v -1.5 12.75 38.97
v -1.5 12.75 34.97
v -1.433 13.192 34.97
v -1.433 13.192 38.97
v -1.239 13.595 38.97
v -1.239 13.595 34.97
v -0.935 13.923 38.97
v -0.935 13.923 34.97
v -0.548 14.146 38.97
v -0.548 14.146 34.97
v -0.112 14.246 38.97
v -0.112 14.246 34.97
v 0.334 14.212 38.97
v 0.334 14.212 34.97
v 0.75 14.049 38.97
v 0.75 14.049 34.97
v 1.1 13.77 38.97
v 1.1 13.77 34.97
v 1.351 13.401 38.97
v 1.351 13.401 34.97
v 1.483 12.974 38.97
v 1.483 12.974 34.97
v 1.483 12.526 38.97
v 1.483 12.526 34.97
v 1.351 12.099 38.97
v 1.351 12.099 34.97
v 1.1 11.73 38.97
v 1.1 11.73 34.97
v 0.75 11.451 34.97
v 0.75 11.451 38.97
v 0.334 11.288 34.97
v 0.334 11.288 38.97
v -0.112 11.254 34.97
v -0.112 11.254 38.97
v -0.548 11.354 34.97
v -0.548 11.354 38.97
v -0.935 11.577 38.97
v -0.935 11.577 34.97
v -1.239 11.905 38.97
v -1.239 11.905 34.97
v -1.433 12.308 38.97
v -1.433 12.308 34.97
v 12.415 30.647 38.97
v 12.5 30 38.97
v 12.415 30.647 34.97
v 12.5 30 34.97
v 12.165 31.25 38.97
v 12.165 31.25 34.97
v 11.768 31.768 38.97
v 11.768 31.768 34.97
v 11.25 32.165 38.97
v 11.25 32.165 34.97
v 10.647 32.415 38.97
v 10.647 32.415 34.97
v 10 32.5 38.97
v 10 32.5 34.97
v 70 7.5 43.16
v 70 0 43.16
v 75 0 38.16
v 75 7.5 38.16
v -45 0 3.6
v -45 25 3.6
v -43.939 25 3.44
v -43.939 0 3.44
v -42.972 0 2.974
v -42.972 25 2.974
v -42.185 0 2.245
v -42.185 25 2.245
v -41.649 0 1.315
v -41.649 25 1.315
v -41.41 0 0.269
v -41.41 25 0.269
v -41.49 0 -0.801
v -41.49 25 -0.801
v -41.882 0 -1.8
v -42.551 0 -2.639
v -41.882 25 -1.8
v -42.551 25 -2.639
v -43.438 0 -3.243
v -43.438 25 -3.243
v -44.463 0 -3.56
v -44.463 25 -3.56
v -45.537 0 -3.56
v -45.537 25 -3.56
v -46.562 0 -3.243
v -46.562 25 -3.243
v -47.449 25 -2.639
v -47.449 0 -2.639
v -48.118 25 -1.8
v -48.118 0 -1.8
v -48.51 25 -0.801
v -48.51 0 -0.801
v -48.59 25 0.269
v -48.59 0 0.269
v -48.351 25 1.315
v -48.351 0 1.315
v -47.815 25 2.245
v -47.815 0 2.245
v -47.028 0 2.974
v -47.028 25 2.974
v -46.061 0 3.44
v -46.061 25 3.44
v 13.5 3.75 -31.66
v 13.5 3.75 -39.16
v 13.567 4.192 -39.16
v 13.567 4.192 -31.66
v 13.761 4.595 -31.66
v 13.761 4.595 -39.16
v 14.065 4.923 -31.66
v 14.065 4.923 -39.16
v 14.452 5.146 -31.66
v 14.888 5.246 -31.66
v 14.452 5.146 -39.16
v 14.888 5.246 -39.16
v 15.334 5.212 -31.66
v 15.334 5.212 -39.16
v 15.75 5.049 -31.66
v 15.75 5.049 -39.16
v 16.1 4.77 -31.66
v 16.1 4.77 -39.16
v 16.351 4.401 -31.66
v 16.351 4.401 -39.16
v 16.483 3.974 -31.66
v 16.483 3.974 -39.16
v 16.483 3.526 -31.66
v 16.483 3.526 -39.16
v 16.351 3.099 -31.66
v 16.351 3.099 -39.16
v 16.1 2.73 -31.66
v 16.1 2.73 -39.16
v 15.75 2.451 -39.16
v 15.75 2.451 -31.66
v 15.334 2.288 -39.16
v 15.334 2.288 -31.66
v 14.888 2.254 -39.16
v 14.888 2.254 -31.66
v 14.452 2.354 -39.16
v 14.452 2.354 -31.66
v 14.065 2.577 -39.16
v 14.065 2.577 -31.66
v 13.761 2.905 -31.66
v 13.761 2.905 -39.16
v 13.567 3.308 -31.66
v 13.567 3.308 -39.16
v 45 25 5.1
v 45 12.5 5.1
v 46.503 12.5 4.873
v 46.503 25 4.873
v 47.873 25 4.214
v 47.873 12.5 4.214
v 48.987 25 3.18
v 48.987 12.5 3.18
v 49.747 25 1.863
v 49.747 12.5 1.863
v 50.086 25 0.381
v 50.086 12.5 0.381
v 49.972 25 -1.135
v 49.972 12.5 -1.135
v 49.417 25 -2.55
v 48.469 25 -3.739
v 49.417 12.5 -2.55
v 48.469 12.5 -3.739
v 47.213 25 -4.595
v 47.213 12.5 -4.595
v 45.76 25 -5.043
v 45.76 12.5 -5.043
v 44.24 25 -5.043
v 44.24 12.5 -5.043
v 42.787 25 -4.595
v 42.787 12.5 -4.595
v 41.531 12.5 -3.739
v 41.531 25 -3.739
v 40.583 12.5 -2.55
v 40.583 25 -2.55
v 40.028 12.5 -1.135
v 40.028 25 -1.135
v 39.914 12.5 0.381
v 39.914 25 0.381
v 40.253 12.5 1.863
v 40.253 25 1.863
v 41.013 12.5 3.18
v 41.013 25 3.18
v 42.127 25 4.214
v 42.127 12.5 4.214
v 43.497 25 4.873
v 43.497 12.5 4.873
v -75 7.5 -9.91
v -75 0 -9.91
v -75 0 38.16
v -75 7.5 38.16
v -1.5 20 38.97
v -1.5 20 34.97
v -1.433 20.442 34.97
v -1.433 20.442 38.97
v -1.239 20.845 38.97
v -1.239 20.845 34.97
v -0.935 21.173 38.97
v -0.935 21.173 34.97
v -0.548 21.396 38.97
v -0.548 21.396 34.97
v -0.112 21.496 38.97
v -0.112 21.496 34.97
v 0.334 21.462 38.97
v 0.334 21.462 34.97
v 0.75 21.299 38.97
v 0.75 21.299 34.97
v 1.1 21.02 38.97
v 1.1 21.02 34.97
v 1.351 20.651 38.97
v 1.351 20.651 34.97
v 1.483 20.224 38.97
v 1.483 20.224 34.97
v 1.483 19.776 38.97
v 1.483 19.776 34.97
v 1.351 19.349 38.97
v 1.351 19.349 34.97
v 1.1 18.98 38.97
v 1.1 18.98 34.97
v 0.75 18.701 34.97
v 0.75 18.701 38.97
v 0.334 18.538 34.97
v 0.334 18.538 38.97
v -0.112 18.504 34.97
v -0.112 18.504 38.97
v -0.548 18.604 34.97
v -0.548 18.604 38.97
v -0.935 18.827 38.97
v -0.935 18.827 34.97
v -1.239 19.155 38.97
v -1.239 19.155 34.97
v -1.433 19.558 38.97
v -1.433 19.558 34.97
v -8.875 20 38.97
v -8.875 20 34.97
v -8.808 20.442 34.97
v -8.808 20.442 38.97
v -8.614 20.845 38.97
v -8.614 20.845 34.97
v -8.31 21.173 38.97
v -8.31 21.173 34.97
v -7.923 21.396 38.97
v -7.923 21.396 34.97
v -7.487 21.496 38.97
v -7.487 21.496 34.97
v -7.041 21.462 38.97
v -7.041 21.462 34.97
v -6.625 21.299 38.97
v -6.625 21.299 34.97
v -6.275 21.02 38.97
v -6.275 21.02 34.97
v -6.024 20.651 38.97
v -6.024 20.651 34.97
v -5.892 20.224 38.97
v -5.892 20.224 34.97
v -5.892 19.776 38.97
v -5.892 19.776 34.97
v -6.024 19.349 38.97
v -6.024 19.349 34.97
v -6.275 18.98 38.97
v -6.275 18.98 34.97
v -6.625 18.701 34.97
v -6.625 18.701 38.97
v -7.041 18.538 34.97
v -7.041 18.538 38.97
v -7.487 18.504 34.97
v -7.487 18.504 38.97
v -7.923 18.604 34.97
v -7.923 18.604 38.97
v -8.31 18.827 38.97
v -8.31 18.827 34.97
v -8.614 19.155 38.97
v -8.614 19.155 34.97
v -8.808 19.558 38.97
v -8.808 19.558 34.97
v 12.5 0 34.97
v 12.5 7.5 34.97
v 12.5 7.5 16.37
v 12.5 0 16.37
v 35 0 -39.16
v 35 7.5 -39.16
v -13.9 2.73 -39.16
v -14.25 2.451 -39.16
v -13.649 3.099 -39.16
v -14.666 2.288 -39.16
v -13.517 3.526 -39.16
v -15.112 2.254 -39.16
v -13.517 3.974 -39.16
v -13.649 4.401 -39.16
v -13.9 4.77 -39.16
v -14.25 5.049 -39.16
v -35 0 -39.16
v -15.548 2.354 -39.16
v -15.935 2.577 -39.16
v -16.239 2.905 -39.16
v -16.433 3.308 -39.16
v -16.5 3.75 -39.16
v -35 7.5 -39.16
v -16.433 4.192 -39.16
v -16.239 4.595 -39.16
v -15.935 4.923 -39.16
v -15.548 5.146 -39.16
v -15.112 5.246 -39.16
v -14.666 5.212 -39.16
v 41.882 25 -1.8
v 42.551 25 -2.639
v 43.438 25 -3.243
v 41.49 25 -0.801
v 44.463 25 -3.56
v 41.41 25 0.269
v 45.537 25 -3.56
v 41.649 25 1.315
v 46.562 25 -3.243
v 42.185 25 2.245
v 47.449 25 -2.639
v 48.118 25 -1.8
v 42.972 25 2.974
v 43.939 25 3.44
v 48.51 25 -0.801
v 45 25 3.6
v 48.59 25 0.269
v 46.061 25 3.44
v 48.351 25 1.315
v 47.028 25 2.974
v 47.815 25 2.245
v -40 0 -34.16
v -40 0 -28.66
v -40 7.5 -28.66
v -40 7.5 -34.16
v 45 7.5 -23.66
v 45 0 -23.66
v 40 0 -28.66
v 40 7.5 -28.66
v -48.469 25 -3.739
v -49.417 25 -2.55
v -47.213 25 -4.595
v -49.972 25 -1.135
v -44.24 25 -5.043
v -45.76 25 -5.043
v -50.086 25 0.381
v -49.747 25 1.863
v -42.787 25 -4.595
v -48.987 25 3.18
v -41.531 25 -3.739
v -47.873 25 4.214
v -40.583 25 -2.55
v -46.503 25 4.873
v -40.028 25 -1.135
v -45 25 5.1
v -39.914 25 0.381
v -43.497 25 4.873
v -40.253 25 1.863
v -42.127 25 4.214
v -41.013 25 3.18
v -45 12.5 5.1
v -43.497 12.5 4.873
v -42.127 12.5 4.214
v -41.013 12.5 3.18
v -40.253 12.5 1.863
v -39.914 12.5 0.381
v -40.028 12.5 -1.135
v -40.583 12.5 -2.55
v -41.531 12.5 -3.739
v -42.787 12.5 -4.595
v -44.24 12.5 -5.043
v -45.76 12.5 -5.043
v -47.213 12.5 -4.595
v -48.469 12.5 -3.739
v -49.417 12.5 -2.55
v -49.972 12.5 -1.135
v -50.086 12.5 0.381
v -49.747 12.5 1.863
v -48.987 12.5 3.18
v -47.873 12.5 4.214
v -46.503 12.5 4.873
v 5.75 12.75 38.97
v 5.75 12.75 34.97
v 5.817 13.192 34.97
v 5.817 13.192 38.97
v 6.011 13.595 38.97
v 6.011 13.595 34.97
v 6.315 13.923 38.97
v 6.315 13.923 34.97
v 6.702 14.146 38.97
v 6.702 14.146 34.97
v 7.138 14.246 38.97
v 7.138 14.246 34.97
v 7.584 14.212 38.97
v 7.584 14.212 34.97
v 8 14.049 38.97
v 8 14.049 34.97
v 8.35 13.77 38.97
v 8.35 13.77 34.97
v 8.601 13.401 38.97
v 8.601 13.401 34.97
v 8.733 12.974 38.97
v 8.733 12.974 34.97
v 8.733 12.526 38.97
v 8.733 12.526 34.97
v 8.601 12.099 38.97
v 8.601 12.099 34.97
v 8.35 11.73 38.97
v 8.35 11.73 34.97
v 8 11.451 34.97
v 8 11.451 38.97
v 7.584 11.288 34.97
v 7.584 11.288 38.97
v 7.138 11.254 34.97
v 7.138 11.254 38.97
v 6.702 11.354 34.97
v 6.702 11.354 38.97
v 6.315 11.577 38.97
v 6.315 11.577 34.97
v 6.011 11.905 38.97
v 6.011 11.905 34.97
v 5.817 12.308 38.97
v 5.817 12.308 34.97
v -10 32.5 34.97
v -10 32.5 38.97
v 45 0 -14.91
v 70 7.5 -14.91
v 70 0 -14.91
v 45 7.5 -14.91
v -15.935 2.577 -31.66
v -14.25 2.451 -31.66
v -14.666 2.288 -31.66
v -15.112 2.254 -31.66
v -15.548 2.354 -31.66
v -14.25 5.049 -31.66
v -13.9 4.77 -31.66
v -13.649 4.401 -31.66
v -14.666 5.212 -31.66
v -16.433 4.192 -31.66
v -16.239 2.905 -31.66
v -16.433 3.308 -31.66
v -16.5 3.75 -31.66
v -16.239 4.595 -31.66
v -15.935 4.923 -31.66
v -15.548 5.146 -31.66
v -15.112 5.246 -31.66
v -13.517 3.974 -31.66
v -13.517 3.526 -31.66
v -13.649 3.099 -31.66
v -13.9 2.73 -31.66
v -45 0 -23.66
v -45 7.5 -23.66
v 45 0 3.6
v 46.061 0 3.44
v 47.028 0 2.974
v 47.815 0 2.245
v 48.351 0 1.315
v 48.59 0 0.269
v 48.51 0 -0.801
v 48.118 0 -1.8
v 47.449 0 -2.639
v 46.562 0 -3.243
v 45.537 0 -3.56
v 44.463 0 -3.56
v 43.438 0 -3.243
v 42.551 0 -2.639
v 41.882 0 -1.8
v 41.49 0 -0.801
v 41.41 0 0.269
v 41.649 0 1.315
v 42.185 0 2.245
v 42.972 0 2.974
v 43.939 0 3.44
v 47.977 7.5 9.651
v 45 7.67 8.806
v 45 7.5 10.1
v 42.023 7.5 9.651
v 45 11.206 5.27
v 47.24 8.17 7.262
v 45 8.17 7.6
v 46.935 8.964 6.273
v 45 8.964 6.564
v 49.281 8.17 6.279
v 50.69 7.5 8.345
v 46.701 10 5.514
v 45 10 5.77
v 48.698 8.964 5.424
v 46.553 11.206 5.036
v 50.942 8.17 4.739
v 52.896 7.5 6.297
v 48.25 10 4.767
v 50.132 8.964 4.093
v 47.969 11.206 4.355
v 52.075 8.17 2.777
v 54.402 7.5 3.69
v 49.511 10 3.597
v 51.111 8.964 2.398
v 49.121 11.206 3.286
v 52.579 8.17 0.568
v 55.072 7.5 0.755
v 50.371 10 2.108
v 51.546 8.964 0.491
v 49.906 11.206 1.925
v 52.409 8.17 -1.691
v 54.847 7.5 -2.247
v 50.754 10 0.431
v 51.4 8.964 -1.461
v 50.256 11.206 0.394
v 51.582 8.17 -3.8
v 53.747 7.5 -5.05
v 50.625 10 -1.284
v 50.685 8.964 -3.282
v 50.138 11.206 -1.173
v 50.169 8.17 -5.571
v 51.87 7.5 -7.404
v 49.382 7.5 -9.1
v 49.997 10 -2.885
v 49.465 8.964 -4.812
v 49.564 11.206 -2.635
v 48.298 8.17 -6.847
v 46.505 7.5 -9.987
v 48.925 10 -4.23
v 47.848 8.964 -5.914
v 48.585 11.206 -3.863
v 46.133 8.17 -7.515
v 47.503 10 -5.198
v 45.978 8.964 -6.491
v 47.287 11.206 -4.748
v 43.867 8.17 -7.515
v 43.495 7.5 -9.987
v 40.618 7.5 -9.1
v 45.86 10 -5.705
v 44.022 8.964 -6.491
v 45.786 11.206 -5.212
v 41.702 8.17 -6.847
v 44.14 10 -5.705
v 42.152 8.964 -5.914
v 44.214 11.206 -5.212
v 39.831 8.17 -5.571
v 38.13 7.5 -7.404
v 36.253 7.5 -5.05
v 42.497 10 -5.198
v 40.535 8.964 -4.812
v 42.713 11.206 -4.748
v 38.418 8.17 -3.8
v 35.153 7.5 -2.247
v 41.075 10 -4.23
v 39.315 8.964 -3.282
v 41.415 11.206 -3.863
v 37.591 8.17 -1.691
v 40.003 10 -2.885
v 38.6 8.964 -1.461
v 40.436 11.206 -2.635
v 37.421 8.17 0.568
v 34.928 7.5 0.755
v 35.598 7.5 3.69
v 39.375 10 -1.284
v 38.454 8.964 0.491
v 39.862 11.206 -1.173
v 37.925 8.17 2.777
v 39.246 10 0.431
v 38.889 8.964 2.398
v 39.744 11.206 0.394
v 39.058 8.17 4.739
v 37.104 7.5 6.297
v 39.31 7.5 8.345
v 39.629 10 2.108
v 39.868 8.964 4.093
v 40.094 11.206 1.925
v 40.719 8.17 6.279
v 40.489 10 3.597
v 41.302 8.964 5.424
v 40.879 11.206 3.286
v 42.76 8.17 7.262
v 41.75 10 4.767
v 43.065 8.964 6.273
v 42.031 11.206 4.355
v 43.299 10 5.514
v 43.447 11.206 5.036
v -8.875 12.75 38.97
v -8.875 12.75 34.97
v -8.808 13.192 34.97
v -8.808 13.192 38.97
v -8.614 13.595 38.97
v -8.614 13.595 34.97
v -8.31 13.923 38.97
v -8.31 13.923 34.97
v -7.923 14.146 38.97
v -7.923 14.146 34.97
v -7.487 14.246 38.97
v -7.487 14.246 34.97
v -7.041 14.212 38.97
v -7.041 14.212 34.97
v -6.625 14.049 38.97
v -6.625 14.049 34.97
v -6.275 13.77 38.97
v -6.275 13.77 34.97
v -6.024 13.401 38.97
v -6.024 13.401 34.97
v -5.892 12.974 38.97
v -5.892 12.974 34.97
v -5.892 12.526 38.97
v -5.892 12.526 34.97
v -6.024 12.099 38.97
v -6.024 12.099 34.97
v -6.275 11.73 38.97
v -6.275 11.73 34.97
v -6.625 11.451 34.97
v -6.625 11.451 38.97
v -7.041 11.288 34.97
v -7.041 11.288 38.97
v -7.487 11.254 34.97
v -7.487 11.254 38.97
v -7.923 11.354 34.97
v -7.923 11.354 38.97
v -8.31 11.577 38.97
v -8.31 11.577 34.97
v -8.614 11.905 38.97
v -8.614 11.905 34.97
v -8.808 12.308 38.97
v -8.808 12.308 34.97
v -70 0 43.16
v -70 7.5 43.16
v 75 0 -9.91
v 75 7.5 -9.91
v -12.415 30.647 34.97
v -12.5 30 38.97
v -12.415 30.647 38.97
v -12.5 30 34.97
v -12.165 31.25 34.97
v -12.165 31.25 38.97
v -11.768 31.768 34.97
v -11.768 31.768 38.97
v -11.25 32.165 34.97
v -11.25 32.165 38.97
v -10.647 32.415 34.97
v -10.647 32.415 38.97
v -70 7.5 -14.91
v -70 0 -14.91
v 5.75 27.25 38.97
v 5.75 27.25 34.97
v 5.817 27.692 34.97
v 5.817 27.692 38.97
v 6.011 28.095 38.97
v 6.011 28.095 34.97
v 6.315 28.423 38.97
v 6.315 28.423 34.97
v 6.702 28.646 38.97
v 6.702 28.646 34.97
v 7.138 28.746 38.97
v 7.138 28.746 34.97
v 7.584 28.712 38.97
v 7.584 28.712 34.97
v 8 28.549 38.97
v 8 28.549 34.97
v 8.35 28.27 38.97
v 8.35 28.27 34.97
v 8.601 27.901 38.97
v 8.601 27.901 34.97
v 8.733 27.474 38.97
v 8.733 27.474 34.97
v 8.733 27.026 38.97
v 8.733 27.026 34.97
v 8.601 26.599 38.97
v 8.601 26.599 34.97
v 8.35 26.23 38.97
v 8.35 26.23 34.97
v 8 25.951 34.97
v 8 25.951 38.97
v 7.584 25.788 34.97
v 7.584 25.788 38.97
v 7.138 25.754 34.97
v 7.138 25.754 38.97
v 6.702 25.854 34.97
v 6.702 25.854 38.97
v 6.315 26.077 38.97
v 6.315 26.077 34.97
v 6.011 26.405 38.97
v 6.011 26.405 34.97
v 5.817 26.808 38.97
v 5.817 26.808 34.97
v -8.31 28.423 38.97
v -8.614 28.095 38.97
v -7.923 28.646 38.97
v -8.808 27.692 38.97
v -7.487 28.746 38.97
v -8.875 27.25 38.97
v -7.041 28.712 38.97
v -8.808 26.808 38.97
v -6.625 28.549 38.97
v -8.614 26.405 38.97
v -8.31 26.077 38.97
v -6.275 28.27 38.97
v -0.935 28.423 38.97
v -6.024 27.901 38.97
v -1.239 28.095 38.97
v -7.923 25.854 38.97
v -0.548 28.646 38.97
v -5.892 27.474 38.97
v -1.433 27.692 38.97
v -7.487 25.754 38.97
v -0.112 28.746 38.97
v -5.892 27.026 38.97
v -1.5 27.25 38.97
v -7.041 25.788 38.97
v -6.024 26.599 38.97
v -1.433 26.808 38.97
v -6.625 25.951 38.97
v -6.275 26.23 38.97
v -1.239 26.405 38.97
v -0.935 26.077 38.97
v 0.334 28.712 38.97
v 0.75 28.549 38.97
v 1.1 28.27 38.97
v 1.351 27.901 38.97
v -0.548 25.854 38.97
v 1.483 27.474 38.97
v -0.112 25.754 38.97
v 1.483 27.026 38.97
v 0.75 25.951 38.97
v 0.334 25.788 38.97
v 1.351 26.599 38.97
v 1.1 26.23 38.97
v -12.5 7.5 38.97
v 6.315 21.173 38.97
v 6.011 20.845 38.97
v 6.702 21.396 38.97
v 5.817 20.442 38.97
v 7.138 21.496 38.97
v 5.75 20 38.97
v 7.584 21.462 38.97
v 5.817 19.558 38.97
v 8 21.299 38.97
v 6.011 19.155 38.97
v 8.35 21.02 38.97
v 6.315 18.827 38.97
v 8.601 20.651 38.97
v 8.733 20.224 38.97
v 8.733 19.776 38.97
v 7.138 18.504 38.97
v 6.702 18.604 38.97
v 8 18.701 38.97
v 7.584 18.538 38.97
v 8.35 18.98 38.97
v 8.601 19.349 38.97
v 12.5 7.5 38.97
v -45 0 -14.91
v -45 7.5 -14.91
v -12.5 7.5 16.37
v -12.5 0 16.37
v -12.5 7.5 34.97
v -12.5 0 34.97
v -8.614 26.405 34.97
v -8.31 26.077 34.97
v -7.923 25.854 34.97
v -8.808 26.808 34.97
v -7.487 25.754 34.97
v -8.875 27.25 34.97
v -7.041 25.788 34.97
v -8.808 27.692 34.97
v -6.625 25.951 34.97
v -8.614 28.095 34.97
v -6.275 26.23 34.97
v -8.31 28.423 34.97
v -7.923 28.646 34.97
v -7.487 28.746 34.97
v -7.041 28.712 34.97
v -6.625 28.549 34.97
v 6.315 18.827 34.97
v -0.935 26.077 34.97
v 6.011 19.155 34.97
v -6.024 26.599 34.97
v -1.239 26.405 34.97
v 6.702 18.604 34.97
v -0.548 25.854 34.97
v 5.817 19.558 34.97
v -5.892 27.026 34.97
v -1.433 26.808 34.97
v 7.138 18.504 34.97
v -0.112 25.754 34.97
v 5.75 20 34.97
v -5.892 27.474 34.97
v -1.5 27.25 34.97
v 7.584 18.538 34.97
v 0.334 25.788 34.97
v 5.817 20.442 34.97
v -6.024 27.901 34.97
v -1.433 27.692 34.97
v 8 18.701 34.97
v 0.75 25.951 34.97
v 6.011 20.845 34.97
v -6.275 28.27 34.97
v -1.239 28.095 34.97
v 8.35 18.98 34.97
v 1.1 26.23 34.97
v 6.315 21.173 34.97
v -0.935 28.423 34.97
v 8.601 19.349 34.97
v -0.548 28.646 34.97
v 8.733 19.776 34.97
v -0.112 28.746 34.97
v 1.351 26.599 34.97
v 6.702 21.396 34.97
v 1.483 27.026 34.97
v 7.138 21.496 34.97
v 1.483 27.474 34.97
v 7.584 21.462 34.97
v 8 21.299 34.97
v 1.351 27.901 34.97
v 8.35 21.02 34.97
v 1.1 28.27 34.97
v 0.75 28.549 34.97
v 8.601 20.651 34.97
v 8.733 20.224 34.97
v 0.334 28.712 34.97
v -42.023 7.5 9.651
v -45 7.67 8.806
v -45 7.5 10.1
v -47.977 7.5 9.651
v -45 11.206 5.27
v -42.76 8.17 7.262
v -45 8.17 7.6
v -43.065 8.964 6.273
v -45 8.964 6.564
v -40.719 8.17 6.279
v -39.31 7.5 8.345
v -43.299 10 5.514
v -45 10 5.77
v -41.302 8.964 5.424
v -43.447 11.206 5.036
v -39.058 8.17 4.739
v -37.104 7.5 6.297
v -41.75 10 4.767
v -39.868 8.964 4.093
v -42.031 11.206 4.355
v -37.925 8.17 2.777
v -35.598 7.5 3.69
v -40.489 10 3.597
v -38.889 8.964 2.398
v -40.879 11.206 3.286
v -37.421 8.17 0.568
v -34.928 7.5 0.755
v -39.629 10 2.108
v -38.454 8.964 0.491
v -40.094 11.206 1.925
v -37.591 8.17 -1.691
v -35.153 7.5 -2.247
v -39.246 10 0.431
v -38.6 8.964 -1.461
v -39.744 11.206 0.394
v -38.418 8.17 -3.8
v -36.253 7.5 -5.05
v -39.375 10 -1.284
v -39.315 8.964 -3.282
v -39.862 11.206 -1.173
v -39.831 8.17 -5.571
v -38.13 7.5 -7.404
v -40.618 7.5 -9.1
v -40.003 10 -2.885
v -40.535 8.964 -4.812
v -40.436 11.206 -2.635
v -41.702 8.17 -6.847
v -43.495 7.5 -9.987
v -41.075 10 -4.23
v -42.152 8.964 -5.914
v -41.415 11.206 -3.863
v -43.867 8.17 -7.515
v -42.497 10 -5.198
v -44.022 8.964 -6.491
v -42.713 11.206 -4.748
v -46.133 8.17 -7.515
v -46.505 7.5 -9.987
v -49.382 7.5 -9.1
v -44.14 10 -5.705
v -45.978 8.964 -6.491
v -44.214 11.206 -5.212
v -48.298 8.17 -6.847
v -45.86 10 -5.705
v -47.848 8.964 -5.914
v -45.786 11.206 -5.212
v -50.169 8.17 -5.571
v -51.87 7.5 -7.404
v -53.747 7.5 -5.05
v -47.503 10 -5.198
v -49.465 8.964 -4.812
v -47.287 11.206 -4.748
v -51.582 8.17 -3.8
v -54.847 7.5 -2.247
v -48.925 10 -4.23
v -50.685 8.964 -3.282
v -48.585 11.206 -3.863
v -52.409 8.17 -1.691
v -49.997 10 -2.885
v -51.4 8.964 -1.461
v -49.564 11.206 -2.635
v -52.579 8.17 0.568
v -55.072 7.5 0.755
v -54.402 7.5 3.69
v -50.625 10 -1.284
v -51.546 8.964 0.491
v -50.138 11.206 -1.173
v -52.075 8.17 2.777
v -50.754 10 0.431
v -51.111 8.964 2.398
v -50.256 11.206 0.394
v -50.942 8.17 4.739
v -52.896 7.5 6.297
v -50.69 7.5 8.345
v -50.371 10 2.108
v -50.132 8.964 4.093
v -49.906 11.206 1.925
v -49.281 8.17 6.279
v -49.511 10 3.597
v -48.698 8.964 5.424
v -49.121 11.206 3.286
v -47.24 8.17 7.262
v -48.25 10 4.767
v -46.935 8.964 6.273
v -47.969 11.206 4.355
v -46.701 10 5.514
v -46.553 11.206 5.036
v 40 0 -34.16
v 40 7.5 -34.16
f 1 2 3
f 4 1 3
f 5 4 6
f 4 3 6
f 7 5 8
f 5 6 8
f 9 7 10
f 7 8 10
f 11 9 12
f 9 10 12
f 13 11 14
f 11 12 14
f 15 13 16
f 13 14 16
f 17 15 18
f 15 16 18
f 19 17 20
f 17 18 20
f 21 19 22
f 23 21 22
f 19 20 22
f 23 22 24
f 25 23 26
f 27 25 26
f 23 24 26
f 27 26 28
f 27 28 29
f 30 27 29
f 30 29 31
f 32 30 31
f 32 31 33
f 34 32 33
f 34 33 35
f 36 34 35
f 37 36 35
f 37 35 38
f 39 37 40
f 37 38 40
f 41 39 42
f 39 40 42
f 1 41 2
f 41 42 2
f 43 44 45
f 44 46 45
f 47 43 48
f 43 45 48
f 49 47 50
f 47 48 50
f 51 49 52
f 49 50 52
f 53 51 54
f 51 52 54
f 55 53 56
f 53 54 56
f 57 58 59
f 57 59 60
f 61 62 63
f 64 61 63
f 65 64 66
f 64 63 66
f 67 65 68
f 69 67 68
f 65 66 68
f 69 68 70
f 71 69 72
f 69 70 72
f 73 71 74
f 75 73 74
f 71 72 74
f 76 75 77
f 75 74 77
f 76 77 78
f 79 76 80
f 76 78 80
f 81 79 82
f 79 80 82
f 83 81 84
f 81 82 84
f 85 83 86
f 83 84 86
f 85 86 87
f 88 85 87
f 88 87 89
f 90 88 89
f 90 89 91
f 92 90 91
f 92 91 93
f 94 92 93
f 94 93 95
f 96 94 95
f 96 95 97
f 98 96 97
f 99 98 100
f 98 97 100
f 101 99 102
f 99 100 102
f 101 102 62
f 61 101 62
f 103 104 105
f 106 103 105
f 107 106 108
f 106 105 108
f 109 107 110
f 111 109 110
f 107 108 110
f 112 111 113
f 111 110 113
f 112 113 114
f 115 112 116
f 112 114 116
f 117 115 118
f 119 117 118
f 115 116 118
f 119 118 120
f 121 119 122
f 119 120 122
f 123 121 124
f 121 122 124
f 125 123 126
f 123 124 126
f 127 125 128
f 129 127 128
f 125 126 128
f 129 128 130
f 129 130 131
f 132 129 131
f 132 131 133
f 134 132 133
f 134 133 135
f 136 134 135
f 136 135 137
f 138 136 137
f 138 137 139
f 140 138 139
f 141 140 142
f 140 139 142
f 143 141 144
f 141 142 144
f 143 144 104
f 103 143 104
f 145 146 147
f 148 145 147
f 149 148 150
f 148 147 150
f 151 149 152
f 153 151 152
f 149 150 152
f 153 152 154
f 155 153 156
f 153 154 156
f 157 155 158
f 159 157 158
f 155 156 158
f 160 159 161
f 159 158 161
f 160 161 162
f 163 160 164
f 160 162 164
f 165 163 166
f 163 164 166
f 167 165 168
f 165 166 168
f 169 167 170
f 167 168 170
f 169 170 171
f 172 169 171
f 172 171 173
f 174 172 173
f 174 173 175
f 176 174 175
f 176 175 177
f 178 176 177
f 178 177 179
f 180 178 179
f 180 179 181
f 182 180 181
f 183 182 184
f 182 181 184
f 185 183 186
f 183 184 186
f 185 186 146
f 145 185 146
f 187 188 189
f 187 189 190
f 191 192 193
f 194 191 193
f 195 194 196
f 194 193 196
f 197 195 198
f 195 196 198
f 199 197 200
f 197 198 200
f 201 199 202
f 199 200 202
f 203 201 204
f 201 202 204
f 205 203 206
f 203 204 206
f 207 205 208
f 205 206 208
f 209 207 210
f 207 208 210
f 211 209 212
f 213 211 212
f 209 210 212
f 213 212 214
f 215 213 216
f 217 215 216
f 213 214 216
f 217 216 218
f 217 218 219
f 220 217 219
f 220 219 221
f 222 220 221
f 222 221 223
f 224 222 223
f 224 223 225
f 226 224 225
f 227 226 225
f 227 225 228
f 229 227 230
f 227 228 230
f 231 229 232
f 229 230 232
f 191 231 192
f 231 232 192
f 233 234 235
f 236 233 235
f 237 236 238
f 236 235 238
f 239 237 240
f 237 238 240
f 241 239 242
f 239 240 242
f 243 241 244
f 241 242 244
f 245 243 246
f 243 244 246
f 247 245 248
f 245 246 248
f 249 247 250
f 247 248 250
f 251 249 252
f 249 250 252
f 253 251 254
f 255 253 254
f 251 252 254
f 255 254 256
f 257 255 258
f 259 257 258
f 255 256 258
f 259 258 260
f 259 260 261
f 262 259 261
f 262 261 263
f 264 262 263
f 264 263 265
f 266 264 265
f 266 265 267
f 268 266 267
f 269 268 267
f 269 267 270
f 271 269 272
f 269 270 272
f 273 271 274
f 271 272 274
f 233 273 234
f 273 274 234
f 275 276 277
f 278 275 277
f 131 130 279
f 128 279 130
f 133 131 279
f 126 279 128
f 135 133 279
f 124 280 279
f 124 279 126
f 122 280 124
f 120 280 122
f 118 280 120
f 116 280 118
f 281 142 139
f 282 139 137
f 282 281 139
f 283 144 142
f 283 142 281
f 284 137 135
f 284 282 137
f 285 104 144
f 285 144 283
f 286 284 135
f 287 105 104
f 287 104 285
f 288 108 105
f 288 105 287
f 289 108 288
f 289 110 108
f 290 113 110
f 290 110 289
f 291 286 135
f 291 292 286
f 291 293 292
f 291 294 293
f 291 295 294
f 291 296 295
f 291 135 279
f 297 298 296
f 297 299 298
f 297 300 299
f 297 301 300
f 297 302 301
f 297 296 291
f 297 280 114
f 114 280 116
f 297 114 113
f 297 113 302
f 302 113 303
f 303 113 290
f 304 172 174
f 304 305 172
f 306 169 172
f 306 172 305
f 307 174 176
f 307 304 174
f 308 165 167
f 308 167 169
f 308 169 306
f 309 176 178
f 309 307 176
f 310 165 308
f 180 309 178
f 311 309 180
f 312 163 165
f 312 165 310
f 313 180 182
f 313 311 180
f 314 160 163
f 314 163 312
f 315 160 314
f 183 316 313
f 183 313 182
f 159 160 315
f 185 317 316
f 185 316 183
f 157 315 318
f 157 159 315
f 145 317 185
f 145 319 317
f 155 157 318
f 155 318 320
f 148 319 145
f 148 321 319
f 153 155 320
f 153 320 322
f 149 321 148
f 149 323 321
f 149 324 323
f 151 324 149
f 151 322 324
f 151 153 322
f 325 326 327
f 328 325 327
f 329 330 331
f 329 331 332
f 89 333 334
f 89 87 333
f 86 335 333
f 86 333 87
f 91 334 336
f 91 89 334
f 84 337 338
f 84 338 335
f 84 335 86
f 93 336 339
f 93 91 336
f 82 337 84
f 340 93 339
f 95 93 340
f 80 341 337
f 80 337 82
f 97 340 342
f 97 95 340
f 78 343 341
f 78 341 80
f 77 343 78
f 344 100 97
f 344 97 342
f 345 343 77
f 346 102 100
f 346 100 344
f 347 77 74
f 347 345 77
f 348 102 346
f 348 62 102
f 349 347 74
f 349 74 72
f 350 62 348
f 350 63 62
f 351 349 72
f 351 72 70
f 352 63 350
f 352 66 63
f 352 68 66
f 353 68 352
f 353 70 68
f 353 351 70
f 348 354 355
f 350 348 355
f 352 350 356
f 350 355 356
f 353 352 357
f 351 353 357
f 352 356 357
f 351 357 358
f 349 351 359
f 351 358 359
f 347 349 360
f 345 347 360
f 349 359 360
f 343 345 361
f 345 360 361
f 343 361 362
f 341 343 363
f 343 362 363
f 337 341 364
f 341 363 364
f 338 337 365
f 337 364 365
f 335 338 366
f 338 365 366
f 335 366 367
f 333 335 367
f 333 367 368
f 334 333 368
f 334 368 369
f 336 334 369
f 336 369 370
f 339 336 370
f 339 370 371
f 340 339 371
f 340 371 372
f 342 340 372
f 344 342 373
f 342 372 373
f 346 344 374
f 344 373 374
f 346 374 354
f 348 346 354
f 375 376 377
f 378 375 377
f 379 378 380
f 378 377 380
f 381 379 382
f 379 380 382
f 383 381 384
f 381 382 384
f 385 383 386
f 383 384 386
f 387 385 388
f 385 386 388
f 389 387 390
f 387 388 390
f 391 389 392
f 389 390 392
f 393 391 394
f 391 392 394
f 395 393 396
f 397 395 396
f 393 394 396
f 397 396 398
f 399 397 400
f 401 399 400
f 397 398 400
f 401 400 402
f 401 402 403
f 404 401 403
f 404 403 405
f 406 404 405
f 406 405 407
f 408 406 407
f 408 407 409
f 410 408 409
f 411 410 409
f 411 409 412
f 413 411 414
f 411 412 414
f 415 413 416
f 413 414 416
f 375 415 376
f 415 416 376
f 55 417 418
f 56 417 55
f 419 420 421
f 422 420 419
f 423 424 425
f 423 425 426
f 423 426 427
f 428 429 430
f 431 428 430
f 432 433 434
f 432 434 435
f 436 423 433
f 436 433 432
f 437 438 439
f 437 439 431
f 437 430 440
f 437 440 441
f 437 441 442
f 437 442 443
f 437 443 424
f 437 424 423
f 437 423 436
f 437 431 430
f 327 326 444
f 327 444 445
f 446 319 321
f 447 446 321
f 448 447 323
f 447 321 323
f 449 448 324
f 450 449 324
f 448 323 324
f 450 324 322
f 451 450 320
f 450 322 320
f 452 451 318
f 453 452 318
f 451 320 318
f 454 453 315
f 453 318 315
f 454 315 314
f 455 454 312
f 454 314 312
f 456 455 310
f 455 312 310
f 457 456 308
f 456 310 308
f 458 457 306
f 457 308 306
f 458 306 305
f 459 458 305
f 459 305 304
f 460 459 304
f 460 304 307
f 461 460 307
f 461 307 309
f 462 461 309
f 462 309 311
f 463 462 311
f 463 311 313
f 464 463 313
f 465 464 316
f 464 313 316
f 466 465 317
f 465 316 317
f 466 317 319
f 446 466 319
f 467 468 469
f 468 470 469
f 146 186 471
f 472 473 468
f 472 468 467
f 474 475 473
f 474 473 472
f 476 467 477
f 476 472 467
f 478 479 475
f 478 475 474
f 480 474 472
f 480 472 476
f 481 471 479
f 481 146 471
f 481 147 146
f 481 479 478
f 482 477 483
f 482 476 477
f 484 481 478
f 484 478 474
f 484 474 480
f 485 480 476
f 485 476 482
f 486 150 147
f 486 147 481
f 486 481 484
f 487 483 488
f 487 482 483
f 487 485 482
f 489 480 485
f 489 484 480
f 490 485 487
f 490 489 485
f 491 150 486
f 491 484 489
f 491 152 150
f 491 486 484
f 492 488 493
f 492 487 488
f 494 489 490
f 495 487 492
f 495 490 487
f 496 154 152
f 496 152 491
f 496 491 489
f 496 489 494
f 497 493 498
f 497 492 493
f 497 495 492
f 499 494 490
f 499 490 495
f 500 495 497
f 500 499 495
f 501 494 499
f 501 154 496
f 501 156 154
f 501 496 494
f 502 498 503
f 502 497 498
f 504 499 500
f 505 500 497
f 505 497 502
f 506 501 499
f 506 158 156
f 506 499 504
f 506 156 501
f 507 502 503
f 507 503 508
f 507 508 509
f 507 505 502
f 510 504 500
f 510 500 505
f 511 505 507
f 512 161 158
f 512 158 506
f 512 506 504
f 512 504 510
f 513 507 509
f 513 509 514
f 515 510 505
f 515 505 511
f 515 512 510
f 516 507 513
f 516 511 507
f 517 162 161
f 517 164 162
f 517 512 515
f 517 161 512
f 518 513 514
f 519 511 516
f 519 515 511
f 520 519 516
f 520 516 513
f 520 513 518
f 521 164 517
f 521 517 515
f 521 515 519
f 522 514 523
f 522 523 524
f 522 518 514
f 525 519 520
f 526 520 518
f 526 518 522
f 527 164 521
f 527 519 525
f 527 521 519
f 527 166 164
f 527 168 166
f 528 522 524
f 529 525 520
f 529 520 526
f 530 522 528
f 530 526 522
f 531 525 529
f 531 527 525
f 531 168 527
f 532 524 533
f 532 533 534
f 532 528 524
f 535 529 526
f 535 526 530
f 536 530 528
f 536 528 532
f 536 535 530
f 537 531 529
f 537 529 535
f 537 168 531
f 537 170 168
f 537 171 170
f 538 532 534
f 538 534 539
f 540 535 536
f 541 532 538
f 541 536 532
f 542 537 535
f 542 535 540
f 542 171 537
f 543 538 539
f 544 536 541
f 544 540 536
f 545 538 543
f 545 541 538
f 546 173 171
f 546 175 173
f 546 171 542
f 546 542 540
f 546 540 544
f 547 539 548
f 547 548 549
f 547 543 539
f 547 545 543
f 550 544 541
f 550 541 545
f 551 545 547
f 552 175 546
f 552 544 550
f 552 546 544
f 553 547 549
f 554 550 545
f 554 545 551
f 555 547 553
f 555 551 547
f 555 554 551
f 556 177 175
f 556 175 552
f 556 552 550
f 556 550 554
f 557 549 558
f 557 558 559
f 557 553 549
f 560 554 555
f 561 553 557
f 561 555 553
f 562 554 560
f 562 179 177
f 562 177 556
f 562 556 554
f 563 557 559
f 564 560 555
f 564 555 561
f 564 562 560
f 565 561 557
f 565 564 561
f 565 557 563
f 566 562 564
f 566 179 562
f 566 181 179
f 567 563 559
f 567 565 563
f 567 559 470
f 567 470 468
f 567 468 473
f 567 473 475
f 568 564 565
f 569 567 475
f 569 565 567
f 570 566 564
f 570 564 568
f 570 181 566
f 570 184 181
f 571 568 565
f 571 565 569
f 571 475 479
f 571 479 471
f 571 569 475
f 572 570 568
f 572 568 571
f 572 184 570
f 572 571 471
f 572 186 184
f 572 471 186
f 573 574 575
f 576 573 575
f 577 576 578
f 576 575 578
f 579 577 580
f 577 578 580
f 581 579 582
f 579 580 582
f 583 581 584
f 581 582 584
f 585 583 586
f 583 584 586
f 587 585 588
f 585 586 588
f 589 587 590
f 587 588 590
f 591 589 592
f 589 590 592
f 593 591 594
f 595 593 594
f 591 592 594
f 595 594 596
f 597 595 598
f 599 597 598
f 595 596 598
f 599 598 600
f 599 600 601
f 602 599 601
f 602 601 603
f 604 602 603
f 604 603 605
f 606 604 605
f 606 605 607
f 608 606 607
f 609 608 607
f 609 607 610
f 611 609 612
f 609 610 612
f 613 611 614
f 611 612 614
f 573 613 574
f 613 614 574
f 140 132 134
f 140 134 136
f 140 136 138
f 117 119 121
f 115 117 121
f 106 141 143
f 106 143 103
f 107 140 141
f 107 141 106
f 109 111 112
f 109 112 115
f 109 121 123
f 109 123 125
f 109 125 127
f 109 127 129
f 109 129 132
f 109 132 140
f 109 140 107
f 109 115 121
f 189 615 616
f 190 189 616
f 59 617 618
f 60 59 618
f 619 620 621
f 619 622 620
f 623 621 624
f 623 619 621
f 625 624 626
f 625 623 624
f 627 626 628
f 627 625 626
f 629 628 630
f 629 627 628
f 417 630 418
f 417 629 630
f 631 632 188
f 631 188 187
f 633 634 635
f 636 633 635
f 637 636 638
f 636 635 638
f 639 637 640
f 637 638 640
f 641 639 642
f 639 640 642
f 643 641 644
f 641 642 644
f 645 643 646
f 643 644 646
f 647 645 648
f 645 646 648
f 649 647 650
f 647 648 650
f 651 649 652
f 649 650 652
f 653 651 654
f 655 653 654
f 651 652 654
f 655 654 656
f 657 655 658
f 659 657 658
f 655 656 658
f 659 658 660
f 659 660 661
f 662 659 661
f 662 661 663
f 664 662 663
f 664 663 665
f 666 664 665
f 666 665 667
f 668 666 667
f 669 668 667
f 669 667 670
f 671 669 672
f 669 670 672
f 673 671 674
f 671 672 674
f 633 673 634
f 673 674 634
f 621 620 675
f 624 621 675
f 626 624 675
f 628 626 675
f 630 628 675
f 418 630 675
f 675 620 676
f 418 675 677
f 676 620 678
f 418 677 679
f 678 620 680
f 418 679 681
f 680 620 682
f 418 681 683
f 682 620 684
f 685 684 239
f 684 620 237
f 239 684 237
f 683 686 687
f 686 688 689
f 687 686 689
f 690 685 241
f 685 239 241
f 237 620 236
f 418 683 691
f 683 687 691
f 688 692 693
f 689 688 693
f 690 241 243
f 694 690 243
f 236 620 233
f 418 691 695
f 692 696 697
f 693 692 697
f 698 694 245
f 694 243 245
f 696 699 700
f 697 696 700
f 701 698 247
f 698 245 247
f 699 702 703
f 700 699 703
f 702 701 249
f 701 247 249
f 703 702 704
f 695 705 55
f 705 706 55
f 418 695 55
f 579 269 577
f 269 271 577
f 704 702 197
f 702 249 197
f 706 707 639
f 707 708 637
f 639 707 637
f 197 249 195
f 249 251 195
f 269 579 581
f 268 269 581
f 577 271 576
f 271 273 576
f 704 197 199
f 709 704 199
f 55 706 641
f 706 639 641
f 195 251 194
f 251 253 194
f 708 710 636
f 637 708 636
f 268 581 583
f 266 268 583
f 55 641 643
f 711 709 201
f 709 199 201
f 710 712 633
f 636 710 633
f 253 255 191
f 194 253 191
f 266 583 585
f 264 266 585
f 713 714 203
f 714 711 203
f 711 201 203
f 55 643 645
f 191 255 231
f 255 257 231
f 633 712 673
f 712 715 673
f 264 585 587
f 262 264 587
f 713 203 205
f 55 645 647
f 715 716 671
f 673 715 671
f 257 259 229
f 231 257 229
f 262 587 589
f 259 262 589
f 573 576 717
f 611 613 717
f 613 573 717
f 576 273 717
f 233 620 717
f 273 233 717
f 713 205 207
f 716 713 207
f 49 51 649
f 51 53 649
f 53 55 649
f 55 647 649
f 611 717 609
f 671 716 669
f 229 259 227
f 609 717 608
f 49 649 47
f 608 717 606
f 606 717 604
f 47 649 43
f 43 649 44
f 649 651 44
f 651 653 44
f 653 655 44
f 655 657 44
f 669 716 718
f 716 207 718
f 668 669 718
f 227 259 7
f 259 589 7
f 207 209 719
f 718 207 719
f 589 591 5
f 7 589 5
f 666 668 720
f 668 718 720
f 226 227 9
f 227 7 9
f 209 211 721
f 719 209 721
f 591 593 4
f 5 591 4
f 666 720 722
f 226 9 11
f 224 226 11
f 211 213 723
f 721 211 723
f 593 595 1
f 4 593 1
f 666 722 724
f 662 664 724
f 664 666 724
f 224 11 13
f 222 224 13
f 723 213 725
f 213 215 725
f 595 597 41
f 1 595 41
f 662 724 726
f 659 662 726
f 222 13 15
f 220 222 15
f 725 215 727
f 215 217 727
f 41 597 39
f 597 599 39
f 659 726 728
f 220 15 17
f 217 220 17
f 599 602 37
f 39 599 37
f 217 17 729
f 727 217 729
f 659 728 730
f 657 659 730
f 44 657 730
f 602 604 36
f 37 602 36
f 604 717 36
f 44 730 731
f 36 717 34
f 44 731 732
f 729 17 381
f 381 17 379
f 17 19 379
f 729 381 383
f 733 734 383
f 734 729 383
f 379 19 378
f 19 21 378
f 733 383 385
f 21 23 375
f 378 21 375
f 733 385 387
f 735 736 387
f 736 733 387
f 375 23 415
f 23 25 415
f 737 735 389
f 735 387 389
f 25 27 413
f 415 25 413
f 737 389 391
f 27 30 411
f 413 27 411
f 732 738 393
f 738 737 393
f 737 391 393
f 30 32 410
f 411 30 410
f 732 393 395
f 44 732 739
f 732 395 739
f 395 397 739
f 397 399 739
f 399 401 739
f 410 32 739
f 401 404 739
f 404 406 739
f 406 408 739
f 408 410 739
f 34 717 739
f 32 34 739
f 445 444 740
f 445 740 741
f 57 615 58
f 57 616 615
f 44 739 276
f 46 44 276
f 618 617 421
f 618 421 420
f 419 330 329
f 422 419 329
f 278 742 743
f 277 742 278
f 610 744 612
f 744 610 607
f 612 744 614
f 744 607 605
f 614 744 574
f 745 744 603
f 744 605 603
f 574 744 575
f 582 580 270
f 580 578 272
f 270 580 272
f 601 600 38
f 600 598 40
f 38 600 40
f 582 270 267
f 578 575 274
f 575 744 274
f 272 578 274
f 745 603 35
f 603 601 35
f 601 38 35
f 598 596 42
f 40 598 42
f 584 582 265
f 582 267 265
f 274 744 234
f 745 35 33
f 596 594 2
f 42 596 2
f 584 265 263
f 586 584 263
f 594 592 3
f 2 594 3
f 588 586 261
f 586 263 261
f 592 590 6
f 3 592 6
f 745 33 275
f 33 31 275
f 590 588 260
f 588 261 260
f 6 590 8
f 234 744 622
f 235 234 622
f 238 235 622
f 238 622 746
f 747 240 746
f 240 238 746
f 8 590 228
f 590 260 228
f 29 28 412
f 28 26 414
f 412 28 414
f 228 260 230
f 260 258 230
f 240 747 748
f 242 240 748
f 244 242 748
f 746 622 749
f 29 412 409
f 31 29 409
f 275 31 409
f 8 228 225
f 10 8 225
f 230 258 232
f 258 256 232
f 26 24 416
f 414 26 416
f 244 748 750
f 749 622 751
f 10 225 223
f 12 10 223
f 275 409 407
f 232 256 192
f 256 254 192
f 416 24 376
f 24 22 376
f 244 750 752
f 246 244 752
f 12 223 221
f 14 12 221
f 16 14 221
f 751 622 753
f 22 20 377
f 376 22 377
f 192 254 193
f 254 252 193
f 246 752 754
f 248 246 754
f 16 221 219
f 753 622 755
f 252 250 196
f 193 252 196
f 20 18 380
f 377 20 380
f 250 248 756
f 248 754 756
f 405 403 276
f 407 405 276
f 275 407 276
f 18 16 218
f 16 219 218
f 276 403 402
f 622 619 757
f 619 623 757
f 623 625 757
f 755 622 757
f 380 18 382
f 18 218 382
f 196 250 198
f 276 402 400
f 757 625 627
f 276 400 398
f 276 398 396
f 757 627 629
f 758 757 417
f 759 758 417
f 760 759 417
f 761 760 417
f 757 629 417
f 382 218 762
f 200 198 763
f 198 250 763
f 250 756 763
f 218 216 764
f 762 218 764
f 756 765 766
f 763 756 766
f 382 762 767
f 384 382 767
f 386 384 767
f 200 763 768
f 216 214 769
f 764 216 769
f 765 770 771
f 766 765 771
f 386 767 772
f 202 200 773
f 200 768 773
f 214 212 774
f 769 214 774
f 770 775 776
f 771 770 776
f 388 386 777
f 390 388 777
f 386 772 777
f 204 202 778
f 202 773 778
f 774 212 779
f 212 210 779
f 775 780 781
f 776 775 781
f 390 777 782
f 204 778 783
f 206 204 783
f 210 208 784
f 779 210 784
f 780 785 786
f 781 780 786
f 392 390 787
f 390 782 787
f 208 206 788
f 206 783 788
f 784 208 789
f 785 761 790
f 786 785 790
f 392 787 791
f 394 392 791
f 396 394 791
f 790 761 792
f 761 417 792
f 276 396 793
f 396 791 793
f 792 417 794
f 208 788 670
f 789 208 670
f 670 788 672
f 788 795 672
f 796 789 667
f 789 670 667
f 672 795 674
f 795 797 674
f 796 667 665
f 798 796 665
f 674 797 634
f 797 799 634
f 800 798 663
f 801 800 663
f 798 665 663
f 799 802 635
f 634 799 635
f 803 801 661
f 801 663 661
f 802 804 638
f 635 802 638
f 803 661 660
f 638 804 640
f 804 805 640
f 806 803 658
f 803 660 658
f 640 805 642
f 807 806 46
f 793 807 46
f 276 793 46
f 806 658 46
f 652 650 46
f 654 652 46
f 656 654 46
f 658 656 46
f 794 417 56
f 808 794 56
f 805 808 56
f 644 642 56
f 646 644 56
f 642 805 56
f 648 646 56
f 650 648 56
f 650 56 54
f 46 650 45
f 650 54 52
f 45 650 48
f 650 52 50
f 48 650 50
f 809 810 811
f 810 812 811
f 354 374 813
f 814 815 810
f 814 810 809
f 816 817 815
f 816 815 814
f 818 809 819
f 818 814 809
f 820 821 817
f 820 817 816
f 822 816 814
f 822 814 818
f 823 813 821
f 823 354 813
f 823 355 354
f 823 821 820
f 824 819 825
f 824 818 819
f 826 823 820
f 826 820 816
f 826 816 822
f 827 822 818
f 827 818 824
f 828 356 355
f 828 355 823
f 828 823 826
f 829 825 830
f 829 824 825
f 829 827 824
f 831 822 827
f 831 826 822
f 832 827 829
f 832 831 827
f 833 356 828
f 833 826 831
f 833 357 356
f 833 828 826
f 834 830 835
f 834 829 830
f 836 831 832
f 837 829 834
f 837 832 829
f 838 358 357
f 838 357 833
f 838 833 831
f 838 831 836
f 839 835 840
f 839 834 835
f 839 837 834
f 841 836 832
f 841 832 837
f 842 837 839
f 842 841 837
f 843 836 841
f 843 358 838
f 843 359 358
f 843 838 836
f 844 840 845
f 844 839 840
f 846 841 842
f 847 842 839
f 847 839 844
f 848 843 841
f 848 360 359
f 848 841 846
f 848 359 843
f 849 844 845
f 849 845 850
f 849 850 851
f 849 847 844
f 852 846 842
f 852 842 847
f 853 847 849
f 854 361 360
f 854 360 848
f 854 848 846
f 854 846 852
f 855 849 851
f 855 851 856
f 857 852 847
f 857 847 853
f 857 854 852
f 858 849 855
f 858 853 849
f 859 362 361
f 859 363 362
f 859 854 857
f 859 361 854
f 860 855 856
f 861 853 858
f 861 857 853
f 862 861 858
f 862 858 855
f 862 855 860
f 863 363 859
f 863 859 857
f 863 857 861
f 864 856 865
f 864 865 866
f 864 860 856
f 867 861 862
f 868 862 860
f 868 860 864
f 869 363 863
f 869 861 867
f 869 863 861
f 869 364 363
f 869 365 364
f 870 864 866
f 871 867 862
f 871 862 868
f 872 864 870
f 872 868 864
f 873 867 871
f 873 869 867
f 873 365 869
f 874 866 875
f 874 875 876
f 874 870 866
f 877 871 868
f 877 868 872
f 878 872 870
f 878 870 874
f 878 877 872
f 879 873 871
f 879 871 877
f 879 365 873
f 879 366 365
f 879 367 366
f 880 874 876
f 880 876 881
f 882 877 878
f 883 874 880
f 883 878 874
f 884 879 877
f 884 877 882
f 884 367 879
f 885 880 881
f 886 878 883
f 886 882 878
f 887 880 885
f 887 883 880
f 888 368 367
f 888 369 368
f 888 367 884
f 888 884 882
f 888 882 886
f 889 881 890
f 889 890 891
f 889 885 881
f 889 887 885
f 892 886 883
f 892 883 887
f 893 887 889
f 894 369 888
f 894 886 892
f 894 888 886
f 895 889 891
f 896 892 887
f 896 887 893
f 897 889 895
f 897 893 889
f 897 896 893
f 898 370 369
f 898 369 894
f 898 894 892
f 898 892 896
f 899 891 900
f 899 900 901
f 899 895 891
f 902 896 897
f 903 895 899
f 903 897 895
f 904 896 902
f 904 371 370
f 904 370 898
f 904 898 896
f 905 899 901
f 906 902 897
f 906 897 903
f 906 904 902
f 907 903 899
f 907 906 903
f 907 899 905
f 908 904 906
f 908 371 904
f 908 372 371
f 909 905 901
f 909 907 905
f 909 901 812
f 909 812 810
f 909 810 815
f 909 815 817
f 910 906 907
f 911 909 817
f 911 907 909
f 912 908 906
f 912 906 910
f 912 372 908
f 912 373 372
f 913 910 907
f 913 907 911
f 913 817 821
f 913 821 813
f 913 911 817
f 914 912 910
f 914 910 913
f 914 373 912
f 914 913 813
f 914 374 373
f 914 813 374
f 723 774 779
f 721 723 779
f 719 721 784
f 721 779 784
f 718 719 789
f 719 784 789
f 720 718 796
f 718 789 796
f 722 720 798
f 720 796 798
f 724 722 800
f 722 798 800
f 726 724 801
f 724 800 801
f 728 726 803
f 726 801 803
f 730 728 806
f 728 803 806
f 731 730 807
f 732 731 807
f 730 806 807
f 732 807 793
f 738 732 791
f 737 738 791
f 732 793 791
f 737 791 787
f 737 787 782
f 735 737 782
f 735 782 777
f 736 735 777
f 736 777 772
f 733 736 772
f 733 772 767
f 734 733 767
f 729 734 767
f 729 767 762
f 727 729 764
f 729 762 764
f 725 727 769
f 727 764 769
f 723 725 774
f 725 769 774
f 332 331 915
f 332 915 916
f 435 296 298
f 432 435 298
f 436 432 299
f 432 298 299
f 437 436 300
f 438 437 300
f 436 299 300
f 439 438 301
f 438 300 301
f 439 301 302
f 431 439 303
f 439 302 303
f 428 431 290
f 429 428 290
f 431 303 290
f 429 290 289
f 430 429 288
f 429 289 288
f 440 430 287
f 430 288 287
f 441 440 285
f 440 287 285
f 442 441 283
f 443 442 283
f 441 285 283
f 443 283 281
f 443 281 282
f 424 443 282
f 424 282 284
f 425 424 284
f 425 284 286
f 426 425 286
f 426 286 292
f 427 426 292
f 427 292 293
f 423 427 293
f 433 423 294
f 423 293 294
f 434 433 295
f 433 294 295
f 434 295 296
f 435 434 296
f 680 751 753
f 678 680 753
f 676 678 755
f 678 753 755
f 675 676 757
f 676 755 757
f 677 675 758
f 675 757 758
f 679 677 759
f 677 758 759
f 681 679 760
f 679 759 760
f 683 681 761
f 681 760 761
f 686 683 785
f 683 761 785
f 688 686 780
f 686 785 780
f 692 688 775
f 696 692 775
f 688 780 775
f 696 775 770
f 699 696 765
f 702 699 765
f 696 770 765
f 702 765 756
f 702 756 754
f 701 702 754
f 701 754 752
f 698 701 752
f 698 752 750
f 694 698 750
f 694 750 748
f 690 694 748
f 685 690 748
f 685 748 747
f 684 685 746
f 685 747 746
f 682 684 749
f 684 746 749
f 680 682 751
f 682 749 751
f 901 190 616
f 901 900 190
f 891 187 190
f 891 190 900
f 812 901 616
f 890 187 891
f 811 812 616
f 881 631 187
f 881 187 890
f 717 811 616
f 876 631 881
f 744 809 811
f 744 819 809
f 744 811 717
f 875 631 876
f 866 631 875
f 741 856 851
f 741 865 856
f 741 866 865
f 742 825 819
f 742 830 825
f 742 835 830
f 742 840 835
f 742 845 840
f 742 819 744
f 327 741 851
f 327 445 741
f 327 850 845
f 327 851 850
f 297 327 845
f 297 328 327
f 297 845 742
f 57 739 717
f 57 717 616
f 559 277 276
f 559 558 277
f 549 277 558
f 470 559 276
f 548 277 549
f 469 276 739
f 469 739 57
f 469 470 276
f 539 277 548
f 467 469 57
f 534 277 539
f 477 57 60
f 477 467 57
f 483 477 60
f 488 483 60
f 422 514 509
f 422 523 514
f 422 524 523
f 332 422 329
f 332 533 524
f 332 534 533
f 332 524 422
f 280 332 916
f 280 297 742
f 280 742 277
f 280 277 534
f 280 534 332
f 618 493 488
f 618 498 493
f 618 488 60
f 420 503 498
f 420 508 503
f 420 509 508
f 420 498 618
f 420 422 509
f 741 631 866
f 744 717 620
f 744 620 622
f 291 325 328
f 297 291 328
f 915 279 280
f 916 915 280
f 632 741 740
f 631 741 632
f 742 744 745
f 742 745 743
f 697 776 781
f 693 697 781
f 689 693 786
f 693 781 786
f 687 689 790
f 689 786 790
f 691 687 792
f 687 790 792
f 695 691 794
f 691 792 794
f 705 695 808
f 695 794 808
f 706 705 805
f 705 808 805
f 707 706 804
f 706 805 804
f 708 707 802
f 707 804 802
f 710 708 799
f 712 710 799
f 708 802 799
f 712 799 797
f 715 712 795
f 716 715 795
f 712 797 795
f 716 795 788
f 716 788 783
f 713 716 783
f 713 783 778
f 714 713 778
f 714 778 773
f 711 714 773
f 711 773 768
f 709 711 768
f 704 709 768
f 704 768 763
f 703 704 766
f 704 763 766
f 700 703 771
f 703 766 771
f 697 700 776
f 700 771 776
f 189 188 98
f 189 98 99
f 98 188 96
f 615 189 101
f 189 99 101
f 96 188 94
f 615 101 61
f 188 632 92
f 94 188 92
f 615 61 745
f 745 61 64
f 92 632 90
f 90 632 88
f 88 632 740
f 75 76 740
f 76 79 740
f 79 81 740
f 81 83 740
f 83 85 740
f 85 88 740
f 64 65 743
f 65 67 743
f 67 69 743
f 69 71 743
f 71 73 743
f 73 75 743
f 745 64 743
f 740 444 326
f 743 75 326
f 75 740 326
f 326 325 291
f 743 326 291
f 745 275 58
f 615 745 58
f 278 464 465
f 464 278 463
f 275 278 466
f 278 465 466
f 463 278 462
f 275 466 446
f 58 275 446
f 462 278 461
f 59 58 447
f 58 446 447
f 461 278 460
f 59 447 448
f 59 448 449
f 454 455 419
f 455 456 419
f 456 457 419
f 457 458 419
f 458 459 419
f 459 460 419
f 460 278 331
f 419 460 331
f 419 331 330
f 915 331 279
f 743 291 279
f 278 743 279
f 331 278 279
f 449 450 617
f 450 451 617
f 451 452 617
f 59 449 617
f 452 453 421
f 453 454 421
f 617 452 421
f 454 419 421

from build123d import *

# Parameters (mm, degrees)
SKETCH1_W           = 150
SKETCH1_H           = 57.32
BOSS_EXTRUDE1_DEPTH = 7.5
SKETCH2_R           = 5.1
BOSS_EXTRUDE2_DEPTH = 17.5
FILLET1_R           = 5
SKETCH3_R           = 3.6
CUT_EXTRUDE1_DEPTH  = 25
SKETCH4_W           = 30
SKETCH4_H           = 7.5
CUT_EXTRUDE2_DEPTH  = 13.75
CHAMFER1_SIZE       = 5
SKETCH5_W           = 80
SKETCH5_H           = 7.5
BOSS_EXTRUDE3_DEPTH = 10.5
CHAMFER2_SIZE       = 5
SKETCH6_R           = 1.5
CUT_EXTRUDE3_DEPTH  = 7.5
SKETCH11_W          = 150
SKETCH11_H          = 7.5
BOSS_EXTRUDE5_DEPTH = 14.5
CHAMFER3_SIZE       = 5
SKETCH12_W          = 25
SKETCH12_H          = 4
BOSS_EXTRUDE6_DEPTH = 25
SKETCH13_W          = 25
SKETCH13_H          = 18.6
CUT_EXTRUDE4_DEPTH  = 7.5
SKETCH14_R          = 1.5
CUT_EXTRUDE5_DEPTH  = 4
FILLET2_R           = 2.5


with BuildPart() as part:
    # Sketch1 → Boss-Extrude1 (new body)
    with BuildSketch(Plane(origin=(0, 0, 0), x_dir=(1, 0, 0), z_dir=(0, 1, 0))):
        Rectangle(SKETCH1_W, SKETCH1_H)
    extrude(amount=BOSS_EXTRUDE1_DEPTH)

    # Sketch2 → Boss-Extrude2 (add)
    with BuildSketch(Plane(origin=(0, 7.5, 0), x_dir=(1, 0, 0), z_dir=(0, 1, 0))):
        with Locations(Location((-45, 0, 0), (0, 0, 270))):
            Circle(SKETCH2_R)
        with Locations(Location((45, 0, 0), (0, 0, 270))):
            Circle(SKETCH2_R)
    extrude(amount=BOSS_EXTRUDE2_DEPTH)

    # Fillet1
    fillet1_edges = [part.edges().sort_by_distance(p)[0] for p in [
        (-45, 7.5, -5.1),
        (45, 7.5, -5.1),
    ]]
    fillet(fillet1_edges, radius=FILLET1_R)

    # Sketch3 → Cut-Extrude1 (cut)
    with BuildSketch(Plane(origin=(0, 25, 0), x_dir=(1, 0, 0), z_dir=(0, 1, 0))):
        with Locations(Location((-45, 0, 0), (0, 0, 270))):
            Circle(SKETCH3_R)
        with Locations(Location((45, 0, 0), (0, 0, 270))):
            Circle(SKETCH3_R)
    extrude(amount=-CUT_EXTRUDE1_DEPTH, mode=Mode.SUBTRACT)

    # Sketch4 → Cut-Extrude2 (cut)
    with BuildSketch(Plane(origin=(0, 0, -28.66), x_dir=(-1, 0, 0), z_dir=(0, 0, -1))):
        with Locations((-60, 3.75)):
            Rectangle(SKETCH4_W, SKETCH4_H)
        with Locations((60, 3.75)):
            Rectangle(SKETCH4_W, SKETCH4_H)
    extrude(amount=-CUT_EXTRUDE2_DEPTH, mode=Mode.SUBTRACT)

    # Chamfer1
    chamfer1_edges = [part.edges().sort_by_distance(p)[0] for p in [
        (75, 3.75, -14.91),
        (45, 3.75, -28.66),
        (-75, 3.75, -14.91),
        (-45, 3.75, -28.66),
    ]]
    chamfer(chamfer1_edges, length=CHAMFER1_SIZE)

    # Sketch5 → Boss-Extrude3 (add)
    with BuildSketch(Plane(origin=(0, 0, -28.66), x_dir=(-1, 0, 0), z_dir=(0, 0, -1))):
        with Locations((0, 3.75)):
            Rectangle(SKETCH5_W, SKETCH5_H)
    extrude(amount=BOSS_EXTRUDE3_DEPTH)

    # Chamfer2
    chamfer2_edges = [part.edges().sort_by_distance(p)[0] for p in [
        (40, 3.75, -39.16),
        (-40, 3.75, -39.16),
    ]]
    chamfer(chamfer2_edges, length=CHAMFER2_SIZE)

    # Sketch6 → Cut-Extrude3 (cut)
    with BuildSketch(Plane(origin=(0, 0, -39.16), x_dir=(-1, 0, 0), z_dir=(0, 0, -1))):
        with Locations((-15, 3.75)):
            Circle(SKETCH6_R)
        with Locations((15, 3.75)):
            Circle(SKETCH6_R)
    extrude(amount=-CUT_EXTRUDE3_DEPTH, mode=Mode.SUBTRACT)

    # Sketch11 → Boss-Extrude5 (add)
    with BuildSketch(Plane.XY.offset(28.66)):
        with Locations((0, 3.75)):
            Rectangle(SKETCH11_W, SKETCH11_H)
    extrude(amount=BOSS_EXTRUDE5_DEPTH)

    # Chamfer3
    chamfer3_edges = [part.edges().sort_by_distance(p)[0] for p in [
        (-75, 3.75, 43.16),
        (75, 3.75, 43.16),
    ]]
    chamfer(chamfer3_edges, length=CHAMFER3_SIZE)

    # Sketch12 → Boss-Extrude6 (add)
    with BuildSketch(Plane(origin=(0, 7.5, 0), x_dir=(1, 0, 0), z_dir=(0, 1, 0))):
        with Locations((0, -36.97)):
            Rectangle(SKETCH12_W, SKETCH12_H)
    extrude(amount=BOSS_EXTRUDE6_DEPTH)

    # Sketch13 → Cut-Extrude4 (cut)
    with BuildSketch(Plane(origin=(0, 7.5, 0), x_dir=(1, 0, 0), z_dir=(0, 1, 0))):
        with Locations((0, -25.67)):
            Rectangle(SKETCH13_W, SKETCH13_H)
    extrude(amount=-CUT_EXTRUDE4_DEPTH, mode=Mode.SUBTRACT)

    # Sketch14 → Cut-Extrude5 (cut)
    with BuildSketch(Plane(origin=(0, 0, 34.97), x_dir=(-1, 0, 0), z_dir=(0, 0, -1))):
        with Locations((7.375, 20)):
            Circle(SKETCH14_R)
        with Locations((7.375, 27.25)):
            Circle(SKETCH14_R)
        with Locations((7.375, 12.75)):
            Circle(SKETCH14_R)
        with Locations((-7.25, 27.25)):
            Circle(SKETCH14_R)
        with Locations((0, 27.25)):
            Circle(SKETCH14_R)
        with Locations((0, 20)):
            Circle(SKETCH14_R)
        with Locations((0, 12.75)):
            Circle(SKETCH14_R)
        with Locations((-7.25, 12.75)):
            Circle(SKETCH14_R)
        with Locations((-7.25, 20)):
            Circle(SKETCH14_R)
    extrude(amount=-CUT_EXTRUDE5_DEPTH, mode=Mode.SUBTRACT)

    # Fillet2
    fillet2_edges = [part.edges().sort_by_distance(p)[0] for p in [
        (-12.5, 32.5, 36.97),
        (12.5, 32.5, 36.97),
    ]]
    fillet(fillet2_edges, radius=FILLET2_R)


solid = part.part
